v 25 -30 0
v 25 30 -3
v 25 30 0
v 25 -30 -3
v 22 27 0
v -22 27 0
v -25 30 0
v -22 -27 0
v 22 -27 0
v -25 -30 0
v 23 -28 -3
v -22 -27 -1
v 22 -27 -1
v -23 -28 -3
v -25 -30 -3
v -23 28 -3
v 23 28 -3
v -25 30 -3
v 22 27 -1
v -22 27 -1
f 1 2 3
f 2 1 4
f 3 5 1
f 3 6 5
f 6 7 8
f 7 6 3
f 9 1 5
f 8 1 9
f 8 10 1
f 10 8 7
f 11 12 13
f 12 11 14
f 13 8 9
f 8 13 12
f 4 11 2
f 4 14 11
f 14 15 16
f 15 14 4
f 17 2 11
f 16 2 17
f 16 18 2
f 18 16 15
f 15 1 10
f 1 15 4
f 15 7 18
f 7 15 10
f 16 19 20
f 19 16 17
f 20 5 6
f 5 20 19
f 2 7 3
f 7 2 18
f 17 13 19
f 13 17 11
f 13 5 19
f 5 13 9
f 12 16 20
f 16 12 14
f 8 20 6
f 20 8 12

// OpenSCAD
module lidsupportline(width, height, thickness, depth)
{
    centroid = [-depth/2, 0, 0];
    translate(centroid) rotate([90, 0, 0]) rotate([0, 90, 0])
        linear_extrude(height=depth) rotate([180, 0, 0])
    {
        polygon(points=[[0,0],[width,0],[width, 1],[thickness, height + 1], [0, thickness + 1]]);
    }
}

module lidsupport(width, height, thickness, x, y)
{

    translate([0, -y/2, 0])rotate([0, 0, 0])
        lidsupportline(width, height, thickness, x);
    translate([0, y/2, 0])rotate([0, 0, 180])
        lidsupportline(width, height, thickness, x);

    translate([x/2, 0, 0])rotate([0, 0, 90])
        lidsupportline(width, height, thickness, y);

    translate([-x/2, 0, 0])rotate([0, 0, -90])
        lidsupportline(width, height, thickness, y);
}
lidsupport(3, 2, 2,50, 60);
//trianglebox(2, 2, 50);
